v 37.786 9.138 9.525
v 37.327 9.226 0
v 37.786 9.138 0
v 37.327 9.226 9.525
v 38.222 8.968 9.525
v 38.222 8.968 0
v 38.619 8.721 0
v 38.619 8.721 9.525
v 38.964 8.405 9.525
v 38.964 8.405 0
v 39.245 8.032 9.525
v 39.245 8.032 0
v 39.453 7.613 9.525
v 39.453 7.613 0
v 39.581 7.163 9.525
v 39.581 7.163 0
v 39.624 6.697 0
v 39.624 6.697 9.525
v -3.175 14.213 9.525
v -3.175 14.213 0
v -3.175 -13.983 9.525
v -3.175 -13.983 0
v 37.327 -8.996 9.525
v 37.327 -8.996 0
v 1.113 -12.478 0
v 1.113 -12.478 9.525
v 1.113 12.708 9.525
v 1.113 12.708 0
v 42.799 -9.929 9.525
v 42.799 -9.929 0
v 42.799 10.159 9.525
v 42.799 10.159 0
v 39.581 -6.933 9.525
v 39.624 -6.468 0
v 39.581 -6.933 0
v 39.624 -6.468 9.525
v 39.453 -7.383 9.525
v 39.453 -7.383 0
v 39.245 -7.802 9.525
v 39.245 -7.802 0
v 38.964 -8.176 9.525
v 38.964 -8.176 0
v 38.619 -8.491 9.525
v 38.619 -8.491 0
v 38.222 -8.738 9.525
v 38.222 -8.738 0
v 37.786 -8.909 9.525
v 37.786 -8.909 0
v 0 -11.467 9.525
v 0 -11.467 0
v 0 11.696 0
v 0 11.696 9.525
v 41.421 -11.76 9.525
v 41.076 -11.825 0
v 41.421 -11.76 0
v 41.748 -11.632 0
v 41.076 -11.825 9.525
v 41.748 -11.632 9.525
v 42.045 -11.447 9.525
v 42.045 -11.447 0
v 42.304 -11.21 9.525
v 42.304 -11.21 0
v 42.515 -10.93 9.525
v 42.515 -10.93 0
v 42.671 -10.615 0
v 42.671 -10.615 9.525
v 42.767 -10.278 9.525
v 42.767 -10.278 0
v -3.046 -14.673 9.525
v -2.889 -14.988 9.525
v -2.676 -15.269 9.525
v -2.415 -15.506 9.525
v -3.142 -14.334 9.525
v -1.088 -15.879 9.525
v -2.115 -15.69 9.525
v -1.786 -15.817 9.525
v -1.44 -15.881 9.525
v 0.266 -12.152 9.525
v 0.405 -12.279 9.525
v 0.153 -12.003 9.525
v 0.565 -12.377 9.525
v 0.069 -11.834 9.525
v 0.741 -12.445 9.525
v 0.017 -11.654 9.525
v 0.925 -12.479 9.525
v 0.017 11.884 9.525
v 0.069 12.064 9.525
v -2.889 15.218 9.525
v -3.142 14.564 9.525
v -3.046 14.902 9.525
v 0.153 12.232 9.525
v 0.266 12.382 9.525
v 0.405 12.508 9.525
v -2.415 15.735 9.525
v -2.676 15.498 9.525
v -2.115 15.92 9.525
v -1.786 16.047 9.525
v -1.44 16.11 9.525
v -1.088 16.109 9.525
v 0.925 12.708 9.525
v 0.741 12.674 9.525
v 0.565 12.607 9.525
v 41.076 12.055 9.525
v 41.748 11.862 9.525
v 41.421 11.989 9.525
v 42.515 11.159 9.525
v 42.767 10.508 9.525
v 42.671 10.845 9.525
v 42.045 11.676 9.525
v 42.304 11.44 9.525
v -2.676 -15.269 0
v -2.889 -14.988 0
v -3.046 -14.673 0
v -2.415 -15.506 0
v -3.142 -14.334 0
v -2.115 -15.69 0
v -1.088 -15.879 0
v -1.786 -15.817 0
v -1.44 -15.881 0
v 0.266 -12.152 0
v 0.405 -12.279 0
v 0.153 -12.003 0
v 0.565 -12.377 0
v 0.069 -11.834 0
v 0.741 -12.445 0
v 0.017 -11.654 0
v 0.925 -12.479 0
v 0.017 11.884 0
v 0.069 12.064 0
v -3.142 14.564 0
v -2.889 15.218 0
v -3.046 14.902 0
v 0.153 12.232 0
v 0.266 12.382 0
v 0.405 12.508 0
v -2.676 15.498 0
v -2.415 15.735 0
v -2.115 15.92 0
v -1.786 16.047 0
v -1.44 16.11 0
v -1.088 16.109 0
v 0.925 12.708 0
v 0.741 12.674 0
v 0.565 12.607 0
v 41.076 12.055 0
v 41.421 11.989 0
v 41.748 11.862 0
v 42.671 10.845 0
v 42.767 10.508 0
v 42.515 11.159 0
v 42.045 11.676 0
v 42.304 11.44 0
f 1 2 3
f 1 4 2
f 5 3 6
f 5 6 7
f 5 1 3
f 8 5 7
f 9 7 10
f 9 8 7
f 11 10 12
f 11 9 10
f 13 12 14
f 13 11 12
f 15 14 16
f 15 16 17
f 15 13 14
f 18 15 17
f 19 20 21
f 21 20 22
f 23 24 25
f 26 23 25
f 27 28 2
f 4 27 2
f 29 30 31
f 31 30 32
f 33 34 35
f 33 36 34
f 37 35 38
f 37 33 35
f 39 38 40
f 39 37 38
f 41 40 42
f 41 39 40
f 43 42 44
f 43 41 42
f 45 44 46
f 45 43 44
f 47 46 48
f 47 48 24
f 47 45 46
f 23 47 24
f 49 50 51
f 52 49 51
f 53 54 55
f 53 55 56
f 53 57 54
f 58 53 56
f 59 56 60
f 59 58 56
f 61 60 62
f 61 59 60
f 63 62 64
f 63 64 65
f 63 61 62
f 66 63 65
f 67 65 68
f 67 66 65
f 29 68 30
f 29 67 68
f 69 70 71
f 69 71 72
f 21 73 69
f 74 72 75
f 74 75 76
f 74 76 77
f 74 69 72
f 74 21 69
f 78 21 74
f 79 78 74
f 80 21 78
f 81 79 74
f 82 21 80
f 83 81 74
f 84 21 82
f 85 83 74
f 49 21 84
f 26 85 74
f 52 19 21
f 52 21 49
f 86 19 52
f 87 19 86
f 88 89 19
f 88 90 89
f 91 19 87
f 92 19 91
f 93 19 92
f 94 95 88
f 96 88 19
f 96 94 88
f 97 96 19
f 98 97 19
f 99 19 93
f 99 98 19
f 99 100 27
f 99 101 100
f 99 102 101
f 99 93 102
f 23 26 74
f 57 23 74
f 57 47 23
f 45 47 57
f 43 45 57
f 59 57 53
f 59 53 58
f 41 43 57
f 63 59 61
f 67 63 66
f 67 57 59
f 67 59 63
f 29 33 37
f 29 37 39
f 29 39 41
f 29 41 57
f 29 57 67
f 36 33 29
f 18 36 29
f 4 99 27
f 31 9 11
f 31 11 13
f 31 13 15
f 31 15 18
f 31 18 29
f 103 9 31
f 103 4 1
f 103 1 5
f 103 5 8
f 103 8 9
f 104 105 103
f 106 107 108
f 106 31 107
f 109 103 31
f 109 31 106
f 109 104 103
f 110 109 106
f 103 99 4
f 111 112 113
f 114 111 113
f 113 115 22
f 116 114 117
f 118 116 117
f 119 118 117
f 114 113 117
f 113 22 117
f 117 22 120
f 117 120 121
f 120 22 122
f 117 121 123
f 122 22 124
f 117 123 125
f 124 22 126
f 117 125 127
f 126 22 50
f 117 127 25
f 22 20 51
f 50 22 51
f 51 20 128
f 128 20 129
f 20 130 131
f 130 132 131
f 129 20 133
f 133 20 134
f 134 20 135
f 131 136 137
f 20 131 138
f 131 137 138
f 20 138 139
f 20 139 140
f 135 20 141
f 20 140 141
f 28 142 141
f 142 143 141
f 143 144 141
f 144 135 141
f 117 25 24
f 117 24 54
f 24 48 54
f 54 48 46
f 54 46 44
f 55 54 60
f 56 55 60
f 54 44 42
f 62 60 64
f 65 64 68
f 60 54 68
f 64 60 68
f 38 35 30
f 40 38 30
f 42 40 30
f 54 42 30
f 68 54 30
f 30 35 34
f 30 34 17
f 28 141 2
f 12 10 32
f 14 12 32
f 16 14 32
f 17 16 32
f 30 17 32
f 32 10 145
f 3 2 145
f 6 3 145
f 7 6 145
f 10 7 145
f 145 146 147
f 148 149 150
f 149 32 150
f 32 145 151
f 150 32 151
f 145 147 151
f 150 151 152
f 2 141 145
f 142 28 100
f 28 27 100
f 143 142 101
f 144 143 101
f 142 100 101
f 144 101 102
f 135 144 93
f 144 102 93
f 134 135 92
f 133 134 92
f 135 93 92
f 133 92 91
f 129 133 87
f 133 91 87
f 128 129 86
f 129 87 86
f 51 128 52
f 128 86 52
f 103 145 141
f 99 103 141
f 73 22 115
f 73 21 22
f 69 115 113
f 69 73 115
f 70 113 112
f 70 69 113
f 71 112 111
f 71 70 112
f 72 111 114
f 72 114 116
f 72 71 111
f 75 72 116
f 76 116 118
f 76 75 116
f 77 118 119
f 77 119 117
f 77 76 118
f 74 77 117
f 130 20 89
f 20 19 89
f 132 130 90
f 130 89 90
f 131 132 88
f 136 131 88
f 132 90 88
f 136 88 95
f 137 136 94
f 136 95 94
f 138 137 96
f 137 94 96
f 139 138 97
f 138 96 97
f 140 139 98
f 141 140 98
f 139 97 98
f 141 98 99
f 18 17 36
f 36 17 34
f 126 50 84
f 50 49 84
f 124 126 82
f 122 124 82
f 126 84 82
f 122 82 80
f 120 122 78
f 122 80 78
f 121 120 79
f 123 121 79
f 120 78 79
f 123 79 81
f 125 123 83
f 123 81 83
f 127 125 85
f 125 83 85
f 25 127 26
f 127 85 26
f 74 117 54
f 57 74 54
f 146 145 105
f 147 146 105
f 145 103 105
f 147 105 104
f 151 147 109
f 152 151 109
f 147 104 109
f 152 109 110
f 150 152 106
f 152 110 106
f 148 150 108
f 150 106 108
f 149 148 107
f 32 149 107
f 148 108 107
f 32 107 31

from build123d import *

# Parameters (mm, degrees)
F1_DEPTH = 9.525
F2_R     = 1.905
F3_R     = 1.016
F4_R     = 2.54


with BuildPart() as f1:
    # F0 (on Top) → F1 (new body)
    with BuildSketch(Plane.XY):
        Polygon((-3.175, 16.309805), (-3.175, -16.08006), (42.799, -11.659483), (42.799, 11.889228), align=None)
        Polygon((39.624, -8.775128), (0, -12.585128), (0, 12.814872), (39.624, 9.004872), align=None, mode=Mode.SUBTRACT)
    extrude(amount=F1_DEPTH)

    # F2
    f2_edges = [f1.edges().sort_by_distance(p)[0] for p in [
        (42.799, -11.659483, 4.7625),
        (42.799, 11.889228, 4.7625),
        (-3.175, 16.309805, 4.7625),
        (-3.175, -16.08006, 4.7625),
    ]]
    fillet(f2_edges, radius=F2_R)

    # F3
    f3_edges = [f1.edges().sort_by_distance(p)[0] for p in [
        (0, 12.814872, 4.7625),
        (0, -12.585128, 4.7625),
    ]]
    fillet(f3_edges, radius=F3_R)

    # F4
    f4_edges = [f1.edges().sort_by_distance(p)[0] for p in [
        (39.624, 9.004872, 4.7625),
        (39.624, -8.775128, 4.7625),
    ]]
    fillet(f4_edges, radius=F4_R)


solid = f1.part
